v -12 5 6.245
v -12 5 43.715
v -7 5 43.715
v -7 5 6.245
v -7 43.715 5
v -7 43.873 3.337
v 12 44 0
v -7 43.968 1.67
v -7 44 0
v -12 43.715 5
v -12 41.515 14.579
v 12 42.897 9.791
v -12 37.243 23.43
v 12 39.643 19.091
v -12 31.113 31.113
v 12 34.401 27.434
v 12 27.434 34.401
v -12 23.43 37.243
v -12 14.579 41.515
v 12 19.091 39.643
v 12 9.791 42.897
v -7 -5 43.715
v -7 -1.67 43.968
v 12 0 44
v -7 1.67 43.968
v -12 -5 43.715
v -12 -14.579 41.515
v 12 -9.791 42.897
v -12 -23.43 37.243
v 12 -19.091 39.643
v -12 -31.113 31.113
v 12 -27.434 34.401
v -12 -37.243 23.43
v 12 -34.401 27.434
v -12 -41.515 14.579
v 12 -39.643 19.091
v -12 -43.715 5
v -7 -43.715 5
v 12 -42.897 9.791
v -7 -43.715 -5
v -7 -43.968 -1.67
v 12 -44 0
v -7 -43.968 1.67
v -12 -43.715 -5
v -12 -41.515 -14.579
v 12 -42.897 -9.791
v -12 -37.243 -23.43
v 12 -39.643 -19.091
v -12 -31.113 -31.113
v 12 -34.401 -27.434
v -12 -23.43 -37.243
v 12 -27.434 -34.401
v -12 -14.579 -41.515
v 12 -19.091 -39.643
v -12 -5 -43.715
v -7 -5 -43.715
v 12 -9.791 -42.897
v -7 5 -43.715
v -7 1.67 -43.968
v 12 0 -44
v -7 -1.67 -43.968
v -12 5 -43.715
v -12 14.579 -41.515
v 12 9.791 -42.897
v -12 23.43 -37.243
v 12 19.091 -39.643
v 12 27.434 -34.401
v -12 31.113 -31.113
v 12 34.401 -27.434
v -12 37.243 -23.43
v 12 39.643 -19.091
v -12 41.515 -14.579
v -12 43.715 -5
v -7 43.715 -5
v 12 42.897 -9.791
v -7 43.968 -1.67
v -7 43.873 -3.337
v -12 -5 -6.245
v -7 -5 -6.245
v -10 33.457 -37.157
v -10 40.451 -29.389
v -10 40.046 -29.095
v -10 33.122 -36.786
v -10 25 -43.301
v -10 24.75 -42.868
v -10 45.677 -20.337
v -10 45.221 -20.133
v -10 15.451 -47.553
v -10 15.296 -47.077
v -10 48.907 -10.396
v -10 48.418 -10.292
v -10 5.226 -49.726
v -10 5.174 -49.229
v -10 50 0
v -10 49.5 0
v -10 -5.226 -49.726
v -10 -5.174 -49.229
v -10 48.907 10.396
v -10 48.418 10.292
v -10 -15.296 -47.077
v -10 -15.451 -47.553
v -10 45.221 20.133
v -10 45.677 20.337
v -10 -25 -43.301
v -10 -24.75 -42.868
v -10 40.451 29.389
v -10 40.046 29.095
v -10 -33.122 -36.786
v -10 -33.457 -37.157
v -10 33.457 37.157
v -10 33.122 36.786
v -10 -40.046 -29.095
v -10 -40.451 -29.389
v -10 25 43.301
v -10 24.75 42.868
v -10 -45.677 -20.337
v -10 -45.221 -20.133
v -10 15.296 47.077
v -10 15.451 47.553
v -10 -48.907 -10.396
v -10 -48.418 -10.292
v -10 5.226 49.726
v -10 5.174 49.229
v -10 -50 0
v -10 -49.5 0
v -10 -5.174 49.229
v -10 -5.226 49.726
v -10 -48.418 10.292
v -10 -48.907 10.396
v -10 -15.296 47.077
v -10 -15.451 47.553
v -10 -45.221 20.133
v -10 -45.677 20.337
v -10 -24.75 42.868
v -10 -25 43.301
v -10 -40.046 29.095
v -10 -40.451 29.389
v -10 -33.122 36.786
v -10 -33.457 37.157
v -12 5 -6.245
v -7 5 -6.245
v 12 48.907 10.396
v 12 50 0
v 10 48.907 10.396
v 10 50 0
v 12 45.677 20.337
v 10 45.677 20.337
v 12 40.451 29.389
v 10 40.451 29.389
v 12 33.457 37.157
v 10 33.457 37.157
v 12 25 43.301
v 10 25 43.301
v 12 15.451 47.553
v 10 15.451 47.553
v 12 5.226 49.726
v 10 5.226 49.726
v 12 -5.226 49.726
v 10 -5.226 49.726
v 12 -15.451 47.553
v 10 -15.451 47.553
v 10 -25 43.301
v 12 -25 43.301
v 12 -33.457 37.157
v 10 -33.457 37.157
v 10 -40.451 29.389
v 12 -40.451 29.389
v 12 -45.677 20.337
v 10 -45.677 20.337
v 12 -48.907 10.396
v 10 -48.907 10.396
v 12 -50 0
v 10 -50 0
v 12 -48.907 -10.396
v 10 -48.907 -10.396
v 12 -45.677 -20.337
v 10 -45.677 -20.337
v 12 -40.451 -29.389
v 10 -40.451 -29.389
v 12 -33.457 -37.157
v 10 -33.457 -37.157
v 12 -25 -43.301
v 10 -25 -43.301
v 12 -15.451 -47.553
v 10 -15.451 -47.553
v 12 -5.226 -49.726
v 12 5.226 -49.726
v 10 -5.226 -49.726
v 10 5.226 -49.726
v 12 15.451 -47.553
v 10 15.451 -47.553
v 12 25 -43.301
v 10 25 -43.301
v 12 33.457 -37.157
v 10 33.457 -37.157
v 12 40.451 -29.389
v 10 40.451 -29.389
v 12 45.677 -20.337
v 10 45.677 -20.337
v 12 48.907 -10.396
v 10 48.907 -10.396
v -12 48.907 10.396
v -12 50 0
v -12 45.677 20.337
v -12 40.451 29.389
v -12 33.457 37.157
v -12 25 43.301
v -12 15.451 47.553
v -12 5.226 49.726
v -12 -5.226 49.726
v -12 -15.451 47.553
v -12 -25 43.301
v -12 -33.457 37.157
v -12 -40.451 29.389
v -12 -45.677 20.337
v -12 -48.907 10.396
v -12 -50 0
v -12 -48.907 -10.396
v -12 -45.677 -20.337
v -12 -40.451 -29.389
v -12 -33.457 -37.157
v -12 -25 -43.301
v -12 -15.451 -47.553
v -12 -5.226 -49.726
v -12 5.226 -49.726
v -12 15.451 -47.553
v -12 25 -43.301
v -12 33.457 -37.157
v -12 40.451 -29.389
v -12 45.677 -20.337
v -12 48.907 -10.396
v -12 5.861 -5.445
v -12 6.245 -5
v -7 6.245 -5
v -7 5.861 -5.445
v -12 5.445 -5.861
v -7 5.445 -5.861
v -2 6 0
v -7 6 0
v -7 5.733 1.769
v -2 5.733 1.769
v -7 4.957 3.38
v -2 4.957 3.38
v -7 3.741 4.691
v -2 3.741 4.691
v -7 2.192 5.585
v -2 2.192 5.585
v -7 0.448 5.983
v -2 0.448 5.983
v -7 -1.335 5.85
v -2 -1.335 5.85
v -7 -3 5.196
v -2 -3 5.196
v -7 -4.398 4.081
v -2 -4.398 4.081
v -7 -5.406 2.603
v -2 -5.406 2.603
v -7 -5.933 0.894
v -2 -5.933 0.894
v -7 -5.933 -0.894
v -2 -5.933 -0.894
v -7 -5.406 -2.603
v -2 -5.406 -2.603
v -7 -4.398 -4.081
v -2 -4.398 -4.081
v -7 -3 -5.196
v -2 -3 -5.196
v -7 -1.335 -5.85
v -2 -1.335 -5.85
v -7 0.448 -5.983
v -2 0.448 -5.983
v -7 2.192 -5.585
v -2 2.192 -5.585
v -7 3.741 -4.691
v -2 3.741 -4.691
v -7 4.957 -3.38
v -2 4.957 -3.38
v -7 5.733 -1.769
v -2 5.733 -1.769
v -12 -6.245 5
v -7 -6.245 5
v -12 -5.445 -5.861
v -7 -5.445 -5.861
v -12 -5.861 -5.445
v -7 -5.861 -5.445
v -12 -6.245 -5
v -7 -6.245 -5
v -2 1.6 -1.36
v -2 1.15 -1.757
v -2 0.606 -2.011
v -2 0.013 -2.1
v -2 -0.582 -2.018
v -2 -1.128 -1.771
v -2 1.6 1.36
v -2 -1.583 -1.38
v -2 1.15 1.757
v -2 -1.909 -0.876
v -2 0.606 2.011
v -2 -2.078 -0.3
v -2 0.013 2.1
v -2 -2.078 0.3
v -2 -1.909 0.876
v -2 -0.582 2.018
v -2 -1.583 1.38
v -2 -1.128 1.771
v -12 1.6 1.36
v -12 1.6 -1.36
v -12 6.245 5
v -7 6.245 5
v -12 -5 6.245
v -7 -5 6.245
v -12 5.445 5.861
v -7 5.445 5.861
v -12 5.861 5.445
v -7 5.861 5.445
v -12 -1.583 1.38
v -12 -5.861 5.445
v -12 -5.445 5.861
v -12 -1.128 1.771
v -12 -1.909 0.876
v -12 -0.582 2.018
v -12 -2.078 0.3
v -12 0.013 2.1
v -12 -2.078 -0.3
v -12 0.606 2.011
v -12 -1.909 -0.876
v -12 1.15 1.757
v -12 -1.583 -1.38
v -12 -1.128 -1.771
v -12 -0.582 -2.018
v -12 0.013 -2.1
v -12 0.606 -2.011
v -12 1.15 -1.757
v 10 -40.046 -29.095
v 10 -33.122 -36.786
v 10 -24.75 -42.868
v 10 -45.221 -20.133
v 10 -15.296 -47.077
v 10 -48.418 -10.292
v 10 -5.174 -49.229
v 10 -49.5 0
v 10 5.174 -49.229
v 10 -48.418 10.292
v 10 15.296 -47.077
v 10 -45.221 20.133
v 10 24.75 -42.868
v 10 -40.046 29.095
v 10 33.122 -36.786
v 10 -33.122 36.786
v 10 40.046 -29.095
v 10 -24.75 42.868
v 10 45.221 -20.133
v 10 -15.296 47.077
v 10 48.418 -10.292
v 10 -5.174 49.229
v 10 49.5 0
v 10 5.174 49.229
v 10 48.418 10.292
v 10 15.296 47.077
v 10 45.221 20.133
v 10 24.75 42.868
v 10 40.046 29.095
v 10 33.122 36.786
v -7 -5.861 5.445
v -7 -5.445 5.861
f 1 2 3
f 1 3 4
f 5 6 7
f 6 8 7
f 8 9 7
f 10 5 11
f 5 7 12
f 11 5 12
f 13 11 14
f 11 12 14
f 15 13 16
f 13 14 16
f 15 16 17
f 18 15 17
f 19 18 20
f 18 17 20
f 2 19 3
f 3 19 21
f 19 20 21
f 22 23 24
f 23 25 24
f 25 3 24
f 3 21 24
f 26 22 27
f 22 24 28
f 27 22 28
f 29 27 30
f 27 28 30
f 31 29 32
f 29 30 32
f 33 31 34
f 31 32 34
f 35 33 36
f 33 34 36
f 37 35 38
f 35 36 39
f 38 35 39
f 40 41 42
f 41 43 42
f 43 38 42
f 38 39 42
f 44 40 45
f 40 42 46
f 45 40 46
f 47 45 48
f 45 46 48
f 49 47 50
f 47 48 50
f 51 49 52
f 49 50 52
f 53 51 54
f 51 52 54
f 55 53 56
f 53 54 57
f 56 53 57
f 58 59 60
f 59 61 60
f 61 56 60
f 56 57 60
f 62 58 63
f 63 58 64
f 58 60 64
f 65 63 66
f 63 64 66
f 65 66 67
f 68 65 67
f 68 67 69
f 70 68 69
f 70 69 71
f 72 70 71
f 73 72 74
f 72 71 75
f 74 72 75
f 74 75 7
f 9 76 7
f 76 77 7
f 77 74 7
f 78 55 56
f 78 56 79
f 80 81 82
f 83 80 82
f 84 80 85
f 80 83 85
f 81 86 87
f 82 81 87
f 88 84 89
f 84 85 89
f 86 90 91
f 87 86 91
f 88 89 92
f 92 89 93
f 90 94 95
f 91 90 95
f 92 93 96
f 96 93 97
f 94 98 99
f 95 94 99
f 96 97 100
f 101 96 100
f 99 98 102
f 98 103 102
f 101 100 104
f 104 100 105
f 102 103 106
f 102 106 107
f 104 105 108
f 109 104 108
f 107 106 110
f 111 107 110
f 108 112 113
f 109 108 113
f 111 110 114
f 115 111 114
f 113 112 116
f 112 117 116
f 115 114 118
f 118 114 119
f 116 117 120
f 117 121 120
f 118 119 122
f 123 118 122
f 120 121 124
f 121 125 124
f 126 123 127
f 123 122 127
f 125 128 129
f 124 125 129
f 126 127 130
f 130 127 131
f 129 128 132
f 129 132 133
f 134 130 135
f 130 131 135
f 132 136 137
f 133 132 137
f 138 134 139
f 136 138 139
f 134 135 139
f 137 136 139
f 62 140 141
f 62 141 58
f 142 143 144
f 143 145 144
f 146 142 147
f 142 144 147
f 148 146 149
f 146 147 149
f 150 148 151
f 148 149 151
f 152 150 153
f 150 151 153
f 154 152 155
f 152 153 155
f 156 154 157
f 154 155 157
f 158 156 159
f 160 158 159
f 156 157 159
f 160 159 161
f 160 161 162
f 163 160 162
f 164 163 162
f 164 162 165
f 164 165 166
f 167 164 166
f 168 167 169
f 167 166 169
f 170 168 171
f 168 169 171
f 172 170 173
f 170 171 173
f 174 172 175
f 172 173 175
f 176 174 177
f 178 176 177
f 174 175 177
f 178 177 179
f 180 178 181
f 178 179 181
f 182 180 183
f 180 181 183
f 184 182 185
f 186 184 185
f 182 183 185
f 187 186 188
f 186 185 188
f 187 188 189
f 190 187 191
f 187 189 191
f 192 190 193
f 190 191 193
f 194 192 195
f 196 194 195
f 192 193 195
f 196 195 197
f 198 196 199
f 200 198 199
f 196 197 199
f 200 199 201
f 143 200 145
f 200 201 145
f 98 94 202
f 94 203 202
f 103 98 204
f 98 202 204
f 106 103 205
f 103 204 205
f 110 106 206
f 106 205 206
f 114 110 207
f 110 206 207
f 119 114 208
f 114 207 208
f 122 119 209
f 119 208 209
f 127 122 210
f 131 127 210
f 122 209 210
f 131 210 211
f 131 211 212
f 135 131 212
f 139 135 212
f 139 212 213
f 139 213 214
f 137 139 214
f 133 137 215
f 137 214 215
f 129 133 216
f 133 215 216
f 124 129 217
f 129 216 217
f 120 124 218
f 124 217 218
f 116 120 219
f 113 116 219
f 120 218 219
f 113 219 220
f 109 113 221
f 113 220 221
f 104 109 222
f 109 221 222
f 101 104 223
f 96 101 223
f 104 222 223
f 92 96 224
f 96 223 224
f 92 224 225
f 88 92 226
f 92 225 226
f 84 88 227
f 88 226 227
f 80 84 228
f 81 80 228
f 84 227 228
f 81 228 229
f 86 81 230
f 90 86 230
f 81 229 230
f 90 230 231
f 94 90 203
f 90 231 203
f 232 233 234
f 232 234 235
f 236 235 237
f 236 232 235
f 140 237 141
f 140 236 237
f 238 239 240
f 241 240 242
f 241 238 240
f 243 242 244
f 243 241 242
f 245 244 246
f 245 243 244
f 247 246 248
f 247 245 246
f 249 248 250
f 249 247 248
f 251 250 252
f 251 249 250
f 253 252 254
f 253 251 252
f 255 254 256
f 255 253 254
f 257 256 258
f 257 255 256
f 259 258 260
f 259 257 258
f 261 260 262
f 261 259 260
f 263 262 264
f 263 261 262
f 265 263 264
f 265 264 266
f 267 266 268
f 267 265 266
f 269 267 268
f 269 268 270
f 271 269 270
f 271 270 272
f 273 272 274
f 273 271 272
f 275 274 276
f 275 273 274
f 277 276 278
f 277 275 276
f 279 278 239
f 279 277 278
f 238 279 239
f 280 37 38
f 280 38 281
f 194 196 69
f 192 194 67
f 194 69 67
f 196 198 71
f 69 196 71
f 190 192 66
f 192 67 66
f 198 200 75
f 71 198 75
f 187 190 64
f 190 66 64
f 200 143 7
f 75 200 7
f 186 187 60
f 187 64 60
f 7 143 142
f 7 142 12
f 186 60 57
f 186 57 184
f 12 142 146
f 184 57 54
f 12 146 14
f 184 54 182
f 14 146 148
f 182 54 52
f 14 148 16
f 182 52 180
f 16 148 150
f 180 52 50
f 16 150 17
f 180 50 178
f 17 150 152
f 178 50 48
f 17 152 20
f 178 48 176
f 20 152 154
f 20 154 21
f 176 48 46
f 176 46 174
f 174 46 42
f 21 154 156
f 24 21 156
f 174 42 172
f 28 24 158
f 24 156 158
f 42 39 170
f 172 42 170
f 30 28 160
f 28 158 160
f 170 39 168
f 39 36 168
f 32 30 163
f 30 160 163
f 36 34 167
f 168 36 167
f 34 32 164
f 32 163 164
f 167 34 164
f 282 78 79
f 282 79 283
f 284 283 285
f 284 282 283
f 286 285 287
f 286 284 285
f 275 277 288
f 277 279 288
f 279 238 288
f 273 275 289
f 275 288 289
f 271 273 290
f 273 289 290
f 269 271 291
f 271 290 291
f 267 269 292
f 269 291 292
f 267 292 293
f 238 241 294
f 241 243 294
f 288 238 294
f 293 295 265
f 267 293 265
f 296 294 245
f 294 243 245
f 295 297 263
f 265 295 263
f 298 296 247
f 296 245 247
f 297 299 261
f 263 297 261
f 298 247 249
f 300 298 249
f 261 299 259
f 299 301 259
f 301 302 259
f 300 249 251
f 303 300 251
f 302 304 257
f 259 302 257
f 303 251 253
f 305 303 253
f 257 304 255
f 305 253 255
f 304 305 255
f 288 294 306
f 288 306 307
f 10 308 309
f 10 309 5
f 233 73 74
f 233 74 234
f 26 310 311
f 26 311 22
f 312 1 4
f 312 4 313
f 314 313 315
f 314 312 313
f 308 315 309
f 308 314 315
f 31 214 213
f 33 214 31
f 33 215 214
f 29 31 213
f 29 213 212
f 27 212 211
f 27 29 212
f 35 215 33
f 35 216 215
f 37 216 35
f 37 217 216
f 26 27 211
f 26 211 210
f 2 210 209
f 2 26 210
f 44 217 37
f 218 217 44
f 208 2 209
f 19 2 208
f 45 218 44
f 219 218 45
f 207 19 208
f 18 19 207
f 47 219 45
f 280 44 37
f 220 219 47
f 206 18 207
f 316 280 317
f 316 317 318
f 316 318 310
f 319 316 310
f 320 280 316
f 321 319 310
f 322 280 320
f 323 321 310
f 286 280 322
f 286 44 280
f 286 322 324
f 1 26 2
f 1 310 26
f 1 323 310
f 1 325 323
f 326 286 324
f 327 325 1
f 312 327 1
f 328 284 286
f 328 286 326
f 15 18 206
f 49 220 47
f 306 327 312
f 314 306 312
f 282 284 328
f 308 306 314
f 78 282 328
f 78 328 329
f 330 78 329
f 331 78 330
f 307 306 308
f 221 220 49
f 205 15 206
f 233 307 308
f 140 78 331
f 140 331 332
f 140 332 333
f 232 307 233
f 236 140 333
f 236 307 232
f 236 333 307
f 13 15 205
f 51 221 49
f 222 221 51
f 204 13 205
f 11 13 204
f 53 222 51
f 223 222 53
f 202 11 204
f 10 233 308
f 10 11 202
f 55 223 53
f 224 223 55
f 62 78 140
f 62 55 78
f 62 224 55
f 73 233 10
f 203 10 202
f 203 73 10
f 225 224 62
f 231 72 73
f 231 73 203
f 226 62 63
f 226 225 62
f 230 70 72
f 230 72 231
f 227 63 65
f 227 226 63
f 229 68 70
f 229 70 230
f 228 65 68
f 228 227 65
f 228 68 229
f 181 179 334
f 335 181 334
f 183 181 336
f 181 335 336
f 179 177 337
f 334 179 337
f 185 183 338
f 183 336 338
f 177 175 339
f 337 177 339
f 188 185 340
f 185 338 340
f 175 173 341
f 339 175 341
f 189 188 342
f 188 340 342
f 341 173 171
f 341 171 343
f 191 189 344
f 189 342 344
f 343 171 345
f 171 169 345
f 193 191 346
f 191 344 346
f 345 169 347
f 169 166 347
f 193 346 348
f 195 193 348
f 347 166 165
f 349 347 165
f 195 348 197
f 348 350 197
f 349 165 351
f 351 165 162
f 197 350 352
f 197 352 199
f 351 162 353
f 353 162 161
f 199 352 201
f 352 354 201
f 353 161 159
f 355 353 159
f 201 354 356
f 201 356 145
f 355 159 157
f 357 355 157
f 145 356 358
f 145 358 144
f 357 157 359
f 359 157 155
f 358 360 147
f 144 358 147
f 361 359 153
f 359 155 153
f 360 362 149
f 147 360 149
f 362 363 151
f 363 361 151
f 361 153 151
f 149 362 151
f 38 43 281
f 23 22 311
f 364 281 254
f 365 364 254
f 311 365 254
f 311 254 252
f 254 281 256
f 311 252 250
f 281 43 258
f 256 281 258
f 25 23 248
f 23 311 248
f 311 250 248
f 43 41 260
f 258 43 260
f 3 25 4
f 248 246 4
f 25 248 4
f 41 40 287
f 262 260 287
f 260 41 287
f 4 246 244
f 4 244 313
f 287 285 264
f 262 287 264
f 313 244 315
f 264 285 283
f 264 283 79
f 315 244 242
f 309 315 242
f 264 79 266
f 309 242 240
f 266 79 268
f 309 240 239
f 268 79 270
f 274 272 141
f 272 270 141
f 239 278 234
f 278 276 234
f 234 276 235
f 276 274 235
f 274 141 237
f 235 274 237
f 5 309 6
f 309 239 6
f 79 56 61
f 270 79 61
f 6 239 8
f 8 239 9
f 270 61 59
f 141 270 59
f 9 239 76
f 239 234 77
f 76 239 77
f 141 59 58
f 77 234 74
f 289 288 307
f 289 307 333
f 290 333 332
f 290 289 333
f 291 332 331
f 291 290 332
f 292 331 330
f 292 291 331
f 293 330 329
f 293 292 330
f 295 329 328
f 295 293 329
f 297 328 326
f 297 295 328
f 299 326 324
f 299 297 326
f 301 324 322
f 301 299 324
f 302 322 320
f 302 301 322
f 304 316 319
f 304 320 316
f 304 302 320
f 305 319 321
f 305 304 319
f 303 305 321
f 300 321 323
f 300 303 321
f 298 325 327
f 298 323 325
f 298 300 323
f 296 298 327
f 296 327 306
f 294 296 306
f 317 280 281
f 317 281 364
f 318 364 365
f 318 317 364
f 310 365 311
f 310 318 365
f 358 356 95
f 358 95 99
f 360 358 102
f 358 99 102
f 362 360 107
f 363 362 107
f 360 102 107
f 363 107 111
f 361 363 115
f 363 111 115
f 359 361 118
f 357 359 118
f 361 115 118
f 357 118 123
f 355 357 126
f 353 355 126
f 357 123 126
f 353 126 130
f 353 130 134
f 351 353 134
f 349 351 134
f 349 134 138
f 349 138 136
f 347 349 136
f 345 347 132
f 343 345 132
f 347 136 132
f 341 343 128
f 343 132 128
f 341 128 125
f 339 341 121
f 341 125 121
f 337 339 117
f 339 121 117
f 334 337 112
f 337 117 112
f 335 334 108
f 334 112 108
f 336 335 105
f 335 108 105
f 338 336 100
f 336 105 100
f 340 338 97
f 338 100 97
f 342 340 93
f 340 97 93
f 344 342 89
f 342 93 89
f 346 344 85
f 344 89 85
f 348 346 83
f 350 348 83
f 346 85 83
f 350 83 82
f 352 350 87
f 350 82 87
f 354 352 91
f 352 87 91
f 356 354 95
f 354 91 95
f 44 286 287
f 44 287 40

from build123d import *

# Parameters (mm, degrees)
SKETCH1_W               = 10
SKETCH1_H               = 6
SKETCH2_R               = 6
BOSS_EXTRUDE1_DEPTH     = 5
CUT_EXTRUDE1_DEPTH      = 15
CUT_EXTRUDE1_DEPTH_BACK = 11
CIRPATTERN1_COUNT       = 4


with BuildPart() as part:
    # Sketch1 → Revolve1 (revolve)
    with BuildSketch(Plane.XY):
        Polygon((-12, 50), (-12, 44), (12, 44), (12, 50), (10, 50), (10, 49.5), (-10, 49.5), (-10, 50), align=None)
        with Locations((-7, 3)):
            Rectangle(SKETCH1_W, SKETCH1_H)
    revolve(axis=Axis((0, 0, 0), (1, 0, 0)))

    # Sketch2 → Boss-Extrude1 (add)
    with BuildSketch(Plane(origin=(-12, 0, 0), x_dir=(0, 0, -1), z_dir=(1, 0, 0))):
        with BuildLine():
            Line((-5, 6.244997998), (-5, 43.714985989))
            ThreePointArc((-5, 43.714985989), (0, 44), (5, 43.714985989))
            Line((5, 43.714985989), (5, 6.244997998))
            ThreePointArc((5, 6.244997998), (0, -8), (-5, 6.244997998))
        make_face()
        Circle(SKETCH2_R, mode=Mode.SUBTRACT)
    boss_extrude1 = extrude(amount=BOSS_EXTRUDE1_DEPTH)

    # Sketch3 → Cut-Extrude1 (cut, two sides)
    with BuildSketch(Plane(origin=(-2, 0, 0), x_dir=(0, 0, -1), z_dir=(1, 0, 0))) as cut_extrude1_sk:
        with BuildLine():
            Line((-1.360147051, 1.6), (1.360147051, 1.6))
            ThreePointArc((1.360147051, 1.6), (0, -2.1), (-1.360147051, 1.6))
        make_face()
    extrude(amount=CUT_EXTRUDE1_DEPTH, mode=Mode.SUBTRACT)
    extrude(cut_extrude1_sk.sketch, amount=-CUT_EXTRUDE1_DEPTH_BACK, mode=Mode.SUBTRACT)

    # CirPattern1: Boss-Extrude1 ×4 about axis
    cirpattern1_axis = Axis((0, 0, 0), (1, 0, 0))
    for i in range(1, CIRPATTERN1_COUNT):
        add(boss_extrude1.rotate(cirpattern1_axis, i * 360 / CIRPATTERN1_COUNT))


solid = part.part
